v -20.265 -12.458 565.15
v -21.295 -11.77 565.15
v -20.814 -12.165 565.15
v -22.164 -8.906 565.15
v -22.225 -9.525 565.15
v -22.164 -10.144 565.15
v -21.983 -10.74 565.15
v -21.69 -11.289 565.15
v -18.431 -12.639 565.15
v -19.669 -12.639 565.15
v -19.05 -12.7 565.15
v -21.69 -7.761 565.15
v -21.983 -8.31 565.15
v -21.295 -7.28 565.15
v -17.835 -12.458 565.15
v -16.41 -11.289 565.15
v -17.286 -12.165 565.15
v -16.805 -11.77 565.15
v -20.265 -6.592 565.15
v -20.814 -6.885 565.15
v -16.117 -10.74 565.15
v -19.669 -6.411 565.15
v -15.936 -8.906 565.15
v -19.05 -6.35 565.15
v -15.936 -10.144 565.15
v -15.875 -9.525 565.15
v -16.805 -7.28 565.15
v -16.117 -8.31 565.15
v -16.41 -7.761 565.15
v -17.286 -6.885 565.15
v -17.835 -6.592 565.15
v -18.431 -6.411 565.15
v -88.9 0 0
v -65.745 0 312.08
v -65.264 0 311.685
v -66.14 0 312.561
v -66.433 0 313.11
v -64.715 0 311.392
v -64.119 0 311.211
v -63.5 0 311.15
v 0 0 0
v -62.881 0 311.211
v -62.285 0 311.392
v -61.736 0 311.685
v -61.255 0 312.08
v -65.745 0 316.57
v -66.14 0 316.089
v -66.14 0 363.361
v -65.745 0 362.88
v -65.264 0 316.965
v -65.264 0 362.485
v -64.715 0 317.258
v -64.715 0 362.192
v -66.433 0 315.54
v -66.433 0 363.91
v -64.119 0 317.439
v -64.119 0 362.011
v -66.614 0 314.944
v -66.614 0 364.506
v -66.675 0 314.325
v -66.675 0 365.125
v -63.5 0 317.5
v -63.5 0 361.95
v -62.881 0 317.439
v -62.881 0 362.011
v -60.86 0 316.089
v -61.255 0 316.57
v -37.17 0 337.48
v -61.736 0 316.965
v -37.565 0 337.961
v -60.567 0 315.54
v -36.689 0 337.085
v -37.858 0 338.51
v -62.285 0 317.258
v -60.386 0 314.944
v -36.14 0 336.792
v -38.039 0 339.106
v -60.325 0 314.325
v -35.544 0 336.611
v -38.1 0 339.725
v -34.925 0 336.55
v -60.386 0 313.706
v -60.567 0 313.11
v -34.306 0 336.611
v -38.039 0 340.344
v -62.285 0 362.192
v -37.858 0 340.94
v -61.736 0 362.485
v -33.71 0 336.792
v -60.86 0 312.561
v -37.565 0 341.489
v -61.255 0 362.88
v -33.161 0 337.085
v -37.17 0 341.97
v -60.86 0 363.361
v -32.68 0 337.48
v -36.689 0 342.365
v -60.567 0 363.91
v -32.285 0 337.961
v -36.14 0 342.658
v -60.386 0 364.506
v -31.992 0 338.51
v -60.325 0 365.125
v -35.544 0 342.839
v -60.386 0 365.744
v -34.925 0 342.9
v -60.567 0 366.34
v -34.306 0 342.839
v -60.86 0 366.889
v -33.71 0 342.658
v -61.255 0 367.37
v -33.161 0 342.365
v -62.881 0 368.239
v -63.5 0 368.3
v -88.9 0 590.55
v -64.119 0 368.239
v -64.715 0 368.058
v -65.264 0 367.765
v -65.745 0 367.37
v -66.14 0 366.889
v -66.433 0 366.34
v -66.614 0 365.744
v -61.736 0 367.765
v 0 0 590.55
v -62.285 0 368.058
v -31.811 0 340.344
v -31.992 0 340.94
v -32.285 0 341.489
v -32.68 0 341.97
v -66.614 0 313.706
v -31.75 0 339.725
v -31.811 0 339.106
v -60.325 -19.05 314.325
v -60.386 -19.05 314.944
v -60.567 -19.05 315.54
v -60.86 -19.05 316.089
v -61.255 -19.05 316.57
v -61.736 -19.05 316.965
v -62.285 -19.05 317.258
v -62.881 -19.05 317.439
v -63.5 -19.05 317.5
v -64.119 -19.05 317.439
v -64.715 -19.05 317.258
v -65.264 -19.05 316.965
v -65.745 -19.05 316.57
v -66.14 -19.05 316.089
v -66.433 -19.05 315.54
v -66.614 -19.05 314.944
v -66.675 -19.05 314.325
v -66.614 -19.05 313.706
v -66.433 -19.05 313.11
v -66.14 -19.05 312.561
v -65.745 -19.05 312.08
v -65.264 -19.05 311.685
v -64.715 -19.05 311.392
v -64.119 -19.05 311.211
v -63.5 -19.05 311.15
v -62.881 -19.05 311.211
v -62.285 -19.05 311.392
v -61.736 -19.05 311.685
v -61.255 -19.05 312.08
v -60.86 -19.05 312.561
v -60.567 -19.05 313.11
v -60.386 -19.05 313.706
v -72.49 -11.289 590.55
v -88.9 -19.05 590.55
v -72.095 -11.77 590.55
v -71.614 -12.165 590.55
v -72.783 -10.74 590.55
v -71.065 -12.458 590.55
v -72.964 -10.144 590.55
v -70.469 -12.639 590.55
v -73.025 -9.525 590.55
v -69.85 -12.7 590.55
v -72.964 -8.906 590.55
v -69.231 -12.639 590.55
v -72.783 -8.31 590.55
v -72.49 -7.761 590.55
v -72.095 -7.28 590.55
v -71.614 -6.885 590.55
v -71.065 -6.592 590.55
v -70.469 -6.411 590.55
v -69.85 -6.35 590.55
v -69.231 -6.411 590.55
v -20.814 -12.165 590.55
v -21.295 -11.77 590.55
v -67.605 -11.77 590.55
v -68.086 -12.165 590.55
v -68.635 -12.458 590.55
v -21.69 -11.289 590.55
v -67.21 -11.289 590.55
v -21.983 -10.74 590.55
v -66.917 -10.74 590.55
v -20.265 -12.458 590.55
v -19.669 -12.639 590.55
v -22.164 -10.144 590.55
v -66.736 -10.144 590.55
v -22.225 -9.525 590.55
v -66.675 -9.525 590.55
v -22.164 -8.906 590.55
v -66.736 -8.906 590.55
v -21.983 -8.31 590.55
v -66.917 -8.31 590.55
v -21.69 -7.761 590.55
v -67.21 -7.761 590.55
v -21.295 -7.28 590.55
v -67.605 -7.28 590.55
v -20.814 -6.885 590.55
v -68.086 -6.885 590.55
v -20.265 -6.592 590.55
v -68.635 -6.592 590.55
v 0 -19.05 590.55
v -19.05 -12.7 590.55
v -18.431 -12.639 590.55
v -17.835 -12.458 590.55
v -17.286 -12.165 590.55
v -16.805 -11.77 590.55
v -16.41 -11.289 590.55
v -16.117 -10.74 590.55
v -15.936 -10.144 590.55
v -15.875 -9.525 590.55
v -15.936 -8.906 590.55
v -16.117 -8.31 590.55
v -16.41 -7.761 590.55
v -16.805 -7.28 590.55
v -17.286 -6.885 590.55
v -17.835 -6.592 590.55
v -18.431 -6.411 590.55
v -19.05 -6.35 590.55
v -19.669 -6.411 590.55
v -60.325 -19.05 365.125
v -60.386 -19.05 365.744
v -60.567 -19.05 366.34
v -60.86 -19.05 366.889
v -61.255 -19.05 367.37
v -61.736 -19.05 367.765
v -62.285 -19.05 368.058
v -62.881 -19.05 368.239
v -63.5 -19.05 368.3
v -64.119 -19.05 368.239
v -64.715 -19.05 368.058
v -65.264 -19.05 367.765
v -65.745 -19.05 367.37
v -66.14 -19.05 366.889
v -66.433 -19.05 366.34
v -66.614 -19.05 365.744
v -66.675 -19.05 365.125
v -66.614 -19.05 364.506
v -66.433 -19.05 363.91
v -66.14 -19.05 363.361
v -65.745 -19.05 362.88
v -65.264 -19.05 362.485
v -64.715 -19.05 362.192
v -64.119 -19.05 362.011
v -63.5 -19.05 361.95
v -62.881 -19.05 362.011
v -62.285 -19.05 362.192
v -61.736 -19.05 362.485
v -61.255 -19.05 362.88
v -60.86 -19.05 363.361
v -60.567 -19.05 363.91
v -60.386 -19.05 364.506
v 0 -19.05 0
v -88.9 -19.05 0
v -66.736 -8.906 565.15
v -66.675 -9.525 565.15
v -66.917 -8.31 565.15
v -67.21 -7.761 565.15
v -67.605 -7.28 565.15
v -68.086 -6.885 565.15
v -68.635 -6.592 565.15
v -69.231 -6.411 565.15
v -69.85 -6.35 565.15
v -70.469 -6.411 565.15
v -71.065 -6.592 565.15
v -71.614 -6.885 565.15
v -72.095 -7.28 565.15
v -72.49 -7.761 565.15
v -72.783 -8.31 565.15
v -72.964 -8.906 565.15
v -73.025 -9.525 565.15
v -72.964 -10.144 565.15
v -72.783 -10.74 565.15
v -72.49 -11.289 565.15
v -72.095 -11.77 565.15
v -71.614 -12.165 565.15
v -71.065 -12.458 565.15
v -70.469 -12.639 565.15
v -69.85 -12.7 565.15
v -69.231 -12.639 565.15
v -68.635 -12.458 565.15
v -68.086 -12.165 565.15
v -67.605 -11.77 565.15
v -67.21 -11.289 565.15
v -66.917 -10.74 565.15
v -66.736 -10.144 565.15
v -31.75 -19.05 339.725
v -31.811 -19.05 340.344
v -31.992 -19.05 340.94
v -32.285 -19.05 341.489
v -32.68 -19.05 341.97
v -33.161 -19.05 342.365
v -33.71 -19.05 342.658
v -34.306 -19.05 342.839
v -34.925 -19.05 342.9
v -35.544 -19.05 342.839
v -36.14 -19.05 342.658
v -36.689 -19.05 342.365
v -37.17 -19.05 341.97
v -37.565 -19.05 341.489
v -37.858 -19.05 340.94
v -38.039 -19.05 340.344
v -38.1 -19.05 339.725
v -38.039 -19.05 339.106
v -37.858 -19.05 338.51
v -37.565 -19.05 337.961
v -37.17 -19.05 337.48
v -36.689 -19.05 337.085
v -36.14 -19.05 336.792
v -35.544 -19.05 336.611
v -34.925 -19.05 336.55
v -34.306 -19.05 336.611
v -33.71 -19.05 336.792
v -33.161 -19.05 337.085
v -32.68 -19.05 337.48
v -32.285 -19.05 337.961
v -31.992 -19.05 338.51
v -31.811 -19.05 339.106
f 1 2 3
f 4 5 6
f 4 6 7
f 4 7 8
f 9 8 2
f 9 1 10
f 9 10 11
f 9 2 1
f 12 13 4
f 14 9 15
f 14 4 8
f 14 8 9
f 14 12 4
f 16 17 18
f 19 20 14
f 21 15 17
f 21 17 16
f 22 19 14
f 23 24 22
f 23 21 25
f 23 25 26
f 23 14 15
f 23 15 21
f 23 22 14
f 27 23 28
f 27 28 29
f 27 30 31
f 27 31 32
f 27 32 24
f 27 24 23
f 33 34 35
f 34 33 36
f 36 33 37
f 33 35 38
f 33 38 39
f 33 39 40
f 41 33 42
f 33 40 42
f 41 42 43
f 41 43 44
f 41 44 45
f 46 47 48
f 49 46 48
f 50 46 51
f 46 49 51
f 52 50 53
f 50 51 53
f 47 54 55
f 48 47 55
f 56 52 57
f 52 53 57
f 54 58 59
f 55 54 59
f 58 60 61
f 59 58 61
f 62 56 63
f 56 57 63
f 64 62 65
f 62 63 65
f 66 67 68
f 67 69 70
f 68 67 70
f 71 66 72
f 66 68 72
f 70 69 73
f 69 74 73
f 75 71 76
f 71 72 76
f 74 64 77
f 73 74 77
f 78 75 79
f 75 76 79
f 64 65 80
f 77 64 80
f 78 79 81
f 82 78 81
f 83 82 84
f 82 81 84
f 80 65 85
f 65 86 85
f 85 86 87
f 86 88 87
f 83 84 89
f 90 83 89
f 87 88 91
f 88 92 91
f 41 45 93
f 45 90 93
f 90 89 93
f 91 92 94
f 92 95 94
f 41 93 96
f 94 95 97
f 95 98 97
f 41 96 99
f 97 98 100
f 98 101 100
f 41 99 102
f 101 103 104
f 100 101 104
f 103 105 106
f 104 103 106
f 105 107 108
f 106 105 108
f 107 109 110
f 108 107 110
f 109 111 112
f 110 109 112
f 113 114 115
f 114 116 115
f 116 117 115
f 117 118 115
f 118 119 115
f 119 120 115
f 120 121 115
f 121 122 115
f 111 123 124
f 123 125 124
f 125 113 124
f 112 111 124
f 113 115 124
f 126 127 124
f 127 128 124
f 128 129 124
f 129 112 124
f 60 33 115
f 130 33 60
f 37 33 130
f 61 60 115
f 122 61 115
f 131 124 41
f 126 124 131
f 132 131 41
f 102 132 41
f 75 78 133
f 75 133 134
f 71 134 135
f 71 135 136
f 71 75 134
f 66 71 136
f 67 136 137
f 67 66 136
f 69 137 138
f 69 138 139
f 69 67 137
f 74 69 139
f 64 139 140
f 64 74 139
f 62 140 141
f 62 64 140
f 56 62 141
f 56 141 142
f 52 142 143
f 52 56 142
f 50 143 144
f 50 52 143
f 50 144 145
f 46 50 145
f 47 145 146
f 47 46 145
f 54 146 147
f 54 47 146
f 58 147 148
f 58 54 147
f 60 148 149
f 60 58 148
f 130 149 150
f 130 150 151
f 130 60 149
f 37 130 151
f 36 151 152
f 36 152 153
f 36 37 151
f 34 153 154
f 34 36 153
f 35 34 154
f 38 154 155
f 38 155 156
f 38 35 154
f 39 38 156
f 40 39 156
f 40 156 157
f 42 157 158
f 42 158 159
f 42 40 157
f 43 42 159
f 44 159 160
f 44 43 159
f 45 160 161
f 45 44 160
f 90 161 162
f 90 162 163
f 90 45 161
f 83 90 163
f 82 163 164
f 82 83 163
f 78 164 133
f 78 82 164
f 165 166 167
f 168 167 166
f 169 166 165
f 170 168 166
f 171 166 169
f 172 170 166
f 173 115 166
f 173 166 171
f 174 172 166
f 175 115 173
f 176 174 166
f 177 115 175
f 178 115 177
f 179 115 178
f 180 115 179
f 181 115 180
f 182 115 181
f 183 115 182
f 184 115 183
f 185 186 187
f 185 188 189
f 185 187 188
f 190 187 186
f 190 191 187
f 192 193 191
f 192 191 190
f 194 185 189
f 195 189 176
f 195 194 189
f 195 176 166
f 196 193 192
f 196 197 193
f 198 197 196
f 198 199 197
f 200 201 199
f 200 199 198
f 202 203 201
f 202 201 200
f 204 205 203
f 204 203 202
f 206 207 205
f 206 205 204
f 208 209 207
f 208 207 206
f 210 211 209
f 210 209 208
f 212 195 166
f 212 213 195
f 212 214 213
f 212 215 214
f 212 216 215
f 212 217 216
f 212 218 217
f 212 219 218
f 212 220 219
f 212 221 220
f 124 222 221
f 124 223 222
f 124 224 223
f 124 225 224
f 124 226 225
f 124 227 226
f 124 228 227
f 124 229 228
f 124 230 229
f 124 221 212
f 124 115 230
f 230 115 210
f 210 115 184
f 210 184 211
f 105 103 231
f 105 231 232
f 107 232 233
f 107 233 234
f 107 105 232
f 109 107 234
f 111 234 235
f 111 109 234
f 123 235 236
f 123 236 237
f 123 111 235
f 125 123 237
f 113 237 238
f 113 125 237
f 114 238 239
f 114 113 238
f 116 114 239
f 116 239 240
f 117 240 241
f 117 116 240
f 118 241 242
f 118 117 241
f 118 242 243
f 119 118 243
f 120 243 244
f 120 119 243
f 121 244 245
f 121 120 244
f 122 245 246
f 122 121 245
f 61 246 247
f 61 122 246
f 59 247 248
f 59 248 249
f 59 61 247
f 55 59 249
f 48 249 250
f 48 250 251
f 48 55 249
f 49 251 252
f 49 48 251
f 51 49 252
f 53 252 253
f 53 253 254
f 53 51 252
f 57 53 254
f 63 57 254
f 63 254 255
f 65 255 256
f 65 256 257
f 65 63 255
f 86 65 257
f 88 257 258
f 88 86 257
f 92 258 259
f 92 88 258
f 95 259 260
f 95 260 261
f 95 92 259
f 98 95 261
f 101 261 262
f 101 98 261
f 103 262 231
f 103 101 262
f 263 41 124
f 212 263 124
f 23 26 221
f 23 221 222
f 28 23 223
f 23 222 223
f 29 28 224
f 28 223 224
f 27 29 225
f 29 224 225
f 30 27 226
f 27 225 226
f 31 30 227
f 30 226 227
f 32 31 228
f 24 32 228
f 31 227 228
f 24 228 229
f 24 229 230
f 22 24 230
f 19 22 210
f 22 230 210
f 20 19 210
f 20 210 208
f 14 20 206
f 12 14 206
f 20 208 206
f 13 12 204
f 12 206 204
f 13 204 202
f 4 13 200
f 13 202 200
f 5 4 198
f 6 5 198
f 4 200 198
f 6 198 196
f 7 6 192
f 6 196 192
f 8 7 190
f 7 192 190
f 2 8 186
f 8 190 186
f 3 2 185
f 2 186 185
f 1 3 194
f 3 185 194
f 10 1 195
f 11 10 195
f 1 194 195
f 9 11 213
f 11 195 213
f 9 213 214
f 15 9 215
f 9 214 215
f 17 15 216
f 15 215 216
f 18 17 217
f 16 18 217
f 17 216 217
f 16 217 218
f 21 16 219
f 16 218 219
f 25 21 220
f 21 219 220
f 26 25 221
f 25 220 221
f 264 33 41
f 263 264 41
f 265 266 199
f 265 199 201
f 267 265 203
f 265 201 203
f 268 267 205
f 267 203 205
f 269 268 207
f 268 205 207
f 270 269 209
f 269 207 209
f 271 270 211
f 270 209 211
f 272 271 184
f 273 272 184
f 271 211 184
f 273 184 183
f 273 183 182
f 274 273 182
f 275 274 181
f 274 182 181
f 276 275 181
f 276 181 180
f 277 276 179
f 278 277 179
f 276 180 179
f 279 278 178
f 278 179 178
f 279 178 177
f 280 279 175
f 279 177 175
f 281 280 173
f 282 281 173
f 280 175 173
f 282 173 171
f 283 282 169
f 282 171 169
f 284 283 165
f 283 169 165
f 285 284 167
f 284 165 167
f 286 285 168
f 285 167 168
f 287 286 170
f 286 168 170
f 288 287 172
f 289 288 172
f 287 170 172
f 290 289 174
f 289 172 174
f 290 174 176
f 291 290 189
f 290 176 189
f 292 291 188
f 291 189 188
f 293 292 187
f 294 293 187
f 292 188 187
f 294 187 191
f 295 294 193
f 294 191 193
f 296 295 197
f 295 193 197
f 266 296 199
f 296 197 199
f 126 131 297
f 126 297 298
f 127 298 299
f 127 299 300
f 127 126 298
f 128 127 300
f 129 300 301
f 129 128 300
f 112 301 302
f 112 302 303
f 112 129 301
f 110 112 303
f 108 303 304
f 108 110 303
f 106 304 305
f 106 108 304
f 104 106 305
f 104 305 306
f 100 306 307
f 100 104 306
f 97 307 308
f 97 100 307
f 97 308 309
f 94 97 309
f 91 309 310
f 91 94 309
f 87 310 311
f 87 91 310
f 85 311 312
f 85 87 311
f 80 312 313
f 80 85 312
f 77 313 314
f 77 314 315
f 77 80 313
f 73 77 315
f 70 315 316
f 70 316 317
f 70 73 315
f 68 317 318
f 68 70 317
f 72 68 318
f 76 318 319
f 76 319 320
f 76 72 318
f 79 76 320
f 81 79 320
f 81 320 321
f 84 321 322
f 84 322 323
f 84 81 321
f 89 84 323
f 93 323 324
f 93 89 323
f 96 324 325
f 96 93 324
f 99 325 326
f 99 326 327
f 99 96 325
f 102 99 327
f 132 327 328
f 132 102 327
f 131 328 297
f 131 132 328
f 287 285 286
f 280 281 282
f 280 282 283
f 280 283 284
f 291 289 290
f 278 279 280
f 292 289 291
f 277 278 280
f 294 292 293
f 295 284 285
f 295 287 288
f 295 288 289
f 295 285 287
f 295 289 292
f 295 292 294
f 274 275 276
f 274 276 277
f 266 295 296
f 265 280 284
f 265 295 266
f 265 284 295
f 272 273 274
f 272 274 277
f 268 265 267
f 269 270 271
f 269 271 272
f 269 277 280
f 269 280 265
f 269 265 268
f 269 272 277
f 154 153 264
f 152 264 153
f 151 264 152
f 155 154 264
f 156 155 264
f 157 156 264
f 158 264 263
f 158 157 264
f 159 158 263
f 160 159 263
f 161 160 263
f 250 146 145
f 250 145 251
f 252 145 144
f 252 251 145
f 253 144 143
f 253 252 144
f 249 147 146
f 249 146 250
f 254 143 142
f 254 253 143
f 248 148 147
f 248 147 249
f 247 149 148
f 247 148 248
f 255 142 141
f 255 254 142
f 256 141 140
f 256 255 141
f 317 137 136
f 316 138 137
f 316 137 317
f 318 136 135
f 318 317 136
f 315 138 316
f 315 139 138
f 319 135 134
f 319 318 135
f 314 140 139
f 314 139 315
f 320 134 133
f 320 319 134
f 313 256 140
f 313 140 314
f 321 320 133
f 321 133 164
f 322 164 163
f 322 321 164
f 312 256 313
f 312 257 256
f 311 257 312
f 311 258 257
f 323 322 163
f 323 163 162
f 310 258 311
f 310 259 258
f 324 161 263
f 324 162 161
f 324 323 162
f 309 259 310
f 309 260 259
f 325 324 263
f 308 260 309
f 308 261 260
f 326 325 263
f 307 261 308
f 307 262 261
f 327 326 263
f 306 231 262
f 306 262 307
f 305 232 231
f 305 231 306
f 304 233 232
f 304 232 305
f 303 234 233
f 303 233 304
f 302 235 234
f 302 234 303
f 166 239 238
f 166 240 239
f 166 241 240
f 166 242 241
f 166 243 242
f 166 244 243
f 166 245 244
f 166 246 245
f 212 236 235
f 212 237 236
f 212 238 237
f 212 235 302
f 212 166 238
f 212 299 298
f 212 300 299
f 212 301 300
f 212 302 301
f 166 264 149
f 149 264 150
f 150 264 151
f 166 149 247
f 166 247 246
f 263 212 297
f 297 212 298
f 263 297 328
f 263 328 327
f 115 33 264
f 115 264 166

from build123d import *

# Parameters (mm, degrees)
F0_W     = 88.9
F0_H     = 590.55
F0_R     = 3.175
F1_DEPTH = 19.05
F2_R     = 3.175
F3_DEPTH = 25.4


with BuildPart() as f1:
    # F0 (on Front) → F1 (new body)
    with BuildSketch(Plane.XZ):
        with Locations((-44.45, 295.275)):
            Rectangle(F0_W, F0_H)
        with Locations((-63.5, 314.325)):
            Circle(F0_R, mode=Mode.SUBTRACT)
        with Locations((-63.5, 365.125)):
            Circle(F0_R, mode=Mode.SUBTRACT)
        with Locations((-34.925, 339.725)):
            Circle(F0_R, mode=Mode.SUBTRACT)
    extrude(amount=F1_DEPTH)

    # F2 (on face) → F3 (cut)
    with BuildSketch(Plane.XY.offset(590.55)):
        with Locations((-69.85, -9.525)):
            Circle(F2_R)
        with Locations((-19.05, -9.525)):
            Circle(F2_R)
    extrude(amount=-F3_DEPTH, mode=Mode.SUBTRACT)


solid = f1.part
